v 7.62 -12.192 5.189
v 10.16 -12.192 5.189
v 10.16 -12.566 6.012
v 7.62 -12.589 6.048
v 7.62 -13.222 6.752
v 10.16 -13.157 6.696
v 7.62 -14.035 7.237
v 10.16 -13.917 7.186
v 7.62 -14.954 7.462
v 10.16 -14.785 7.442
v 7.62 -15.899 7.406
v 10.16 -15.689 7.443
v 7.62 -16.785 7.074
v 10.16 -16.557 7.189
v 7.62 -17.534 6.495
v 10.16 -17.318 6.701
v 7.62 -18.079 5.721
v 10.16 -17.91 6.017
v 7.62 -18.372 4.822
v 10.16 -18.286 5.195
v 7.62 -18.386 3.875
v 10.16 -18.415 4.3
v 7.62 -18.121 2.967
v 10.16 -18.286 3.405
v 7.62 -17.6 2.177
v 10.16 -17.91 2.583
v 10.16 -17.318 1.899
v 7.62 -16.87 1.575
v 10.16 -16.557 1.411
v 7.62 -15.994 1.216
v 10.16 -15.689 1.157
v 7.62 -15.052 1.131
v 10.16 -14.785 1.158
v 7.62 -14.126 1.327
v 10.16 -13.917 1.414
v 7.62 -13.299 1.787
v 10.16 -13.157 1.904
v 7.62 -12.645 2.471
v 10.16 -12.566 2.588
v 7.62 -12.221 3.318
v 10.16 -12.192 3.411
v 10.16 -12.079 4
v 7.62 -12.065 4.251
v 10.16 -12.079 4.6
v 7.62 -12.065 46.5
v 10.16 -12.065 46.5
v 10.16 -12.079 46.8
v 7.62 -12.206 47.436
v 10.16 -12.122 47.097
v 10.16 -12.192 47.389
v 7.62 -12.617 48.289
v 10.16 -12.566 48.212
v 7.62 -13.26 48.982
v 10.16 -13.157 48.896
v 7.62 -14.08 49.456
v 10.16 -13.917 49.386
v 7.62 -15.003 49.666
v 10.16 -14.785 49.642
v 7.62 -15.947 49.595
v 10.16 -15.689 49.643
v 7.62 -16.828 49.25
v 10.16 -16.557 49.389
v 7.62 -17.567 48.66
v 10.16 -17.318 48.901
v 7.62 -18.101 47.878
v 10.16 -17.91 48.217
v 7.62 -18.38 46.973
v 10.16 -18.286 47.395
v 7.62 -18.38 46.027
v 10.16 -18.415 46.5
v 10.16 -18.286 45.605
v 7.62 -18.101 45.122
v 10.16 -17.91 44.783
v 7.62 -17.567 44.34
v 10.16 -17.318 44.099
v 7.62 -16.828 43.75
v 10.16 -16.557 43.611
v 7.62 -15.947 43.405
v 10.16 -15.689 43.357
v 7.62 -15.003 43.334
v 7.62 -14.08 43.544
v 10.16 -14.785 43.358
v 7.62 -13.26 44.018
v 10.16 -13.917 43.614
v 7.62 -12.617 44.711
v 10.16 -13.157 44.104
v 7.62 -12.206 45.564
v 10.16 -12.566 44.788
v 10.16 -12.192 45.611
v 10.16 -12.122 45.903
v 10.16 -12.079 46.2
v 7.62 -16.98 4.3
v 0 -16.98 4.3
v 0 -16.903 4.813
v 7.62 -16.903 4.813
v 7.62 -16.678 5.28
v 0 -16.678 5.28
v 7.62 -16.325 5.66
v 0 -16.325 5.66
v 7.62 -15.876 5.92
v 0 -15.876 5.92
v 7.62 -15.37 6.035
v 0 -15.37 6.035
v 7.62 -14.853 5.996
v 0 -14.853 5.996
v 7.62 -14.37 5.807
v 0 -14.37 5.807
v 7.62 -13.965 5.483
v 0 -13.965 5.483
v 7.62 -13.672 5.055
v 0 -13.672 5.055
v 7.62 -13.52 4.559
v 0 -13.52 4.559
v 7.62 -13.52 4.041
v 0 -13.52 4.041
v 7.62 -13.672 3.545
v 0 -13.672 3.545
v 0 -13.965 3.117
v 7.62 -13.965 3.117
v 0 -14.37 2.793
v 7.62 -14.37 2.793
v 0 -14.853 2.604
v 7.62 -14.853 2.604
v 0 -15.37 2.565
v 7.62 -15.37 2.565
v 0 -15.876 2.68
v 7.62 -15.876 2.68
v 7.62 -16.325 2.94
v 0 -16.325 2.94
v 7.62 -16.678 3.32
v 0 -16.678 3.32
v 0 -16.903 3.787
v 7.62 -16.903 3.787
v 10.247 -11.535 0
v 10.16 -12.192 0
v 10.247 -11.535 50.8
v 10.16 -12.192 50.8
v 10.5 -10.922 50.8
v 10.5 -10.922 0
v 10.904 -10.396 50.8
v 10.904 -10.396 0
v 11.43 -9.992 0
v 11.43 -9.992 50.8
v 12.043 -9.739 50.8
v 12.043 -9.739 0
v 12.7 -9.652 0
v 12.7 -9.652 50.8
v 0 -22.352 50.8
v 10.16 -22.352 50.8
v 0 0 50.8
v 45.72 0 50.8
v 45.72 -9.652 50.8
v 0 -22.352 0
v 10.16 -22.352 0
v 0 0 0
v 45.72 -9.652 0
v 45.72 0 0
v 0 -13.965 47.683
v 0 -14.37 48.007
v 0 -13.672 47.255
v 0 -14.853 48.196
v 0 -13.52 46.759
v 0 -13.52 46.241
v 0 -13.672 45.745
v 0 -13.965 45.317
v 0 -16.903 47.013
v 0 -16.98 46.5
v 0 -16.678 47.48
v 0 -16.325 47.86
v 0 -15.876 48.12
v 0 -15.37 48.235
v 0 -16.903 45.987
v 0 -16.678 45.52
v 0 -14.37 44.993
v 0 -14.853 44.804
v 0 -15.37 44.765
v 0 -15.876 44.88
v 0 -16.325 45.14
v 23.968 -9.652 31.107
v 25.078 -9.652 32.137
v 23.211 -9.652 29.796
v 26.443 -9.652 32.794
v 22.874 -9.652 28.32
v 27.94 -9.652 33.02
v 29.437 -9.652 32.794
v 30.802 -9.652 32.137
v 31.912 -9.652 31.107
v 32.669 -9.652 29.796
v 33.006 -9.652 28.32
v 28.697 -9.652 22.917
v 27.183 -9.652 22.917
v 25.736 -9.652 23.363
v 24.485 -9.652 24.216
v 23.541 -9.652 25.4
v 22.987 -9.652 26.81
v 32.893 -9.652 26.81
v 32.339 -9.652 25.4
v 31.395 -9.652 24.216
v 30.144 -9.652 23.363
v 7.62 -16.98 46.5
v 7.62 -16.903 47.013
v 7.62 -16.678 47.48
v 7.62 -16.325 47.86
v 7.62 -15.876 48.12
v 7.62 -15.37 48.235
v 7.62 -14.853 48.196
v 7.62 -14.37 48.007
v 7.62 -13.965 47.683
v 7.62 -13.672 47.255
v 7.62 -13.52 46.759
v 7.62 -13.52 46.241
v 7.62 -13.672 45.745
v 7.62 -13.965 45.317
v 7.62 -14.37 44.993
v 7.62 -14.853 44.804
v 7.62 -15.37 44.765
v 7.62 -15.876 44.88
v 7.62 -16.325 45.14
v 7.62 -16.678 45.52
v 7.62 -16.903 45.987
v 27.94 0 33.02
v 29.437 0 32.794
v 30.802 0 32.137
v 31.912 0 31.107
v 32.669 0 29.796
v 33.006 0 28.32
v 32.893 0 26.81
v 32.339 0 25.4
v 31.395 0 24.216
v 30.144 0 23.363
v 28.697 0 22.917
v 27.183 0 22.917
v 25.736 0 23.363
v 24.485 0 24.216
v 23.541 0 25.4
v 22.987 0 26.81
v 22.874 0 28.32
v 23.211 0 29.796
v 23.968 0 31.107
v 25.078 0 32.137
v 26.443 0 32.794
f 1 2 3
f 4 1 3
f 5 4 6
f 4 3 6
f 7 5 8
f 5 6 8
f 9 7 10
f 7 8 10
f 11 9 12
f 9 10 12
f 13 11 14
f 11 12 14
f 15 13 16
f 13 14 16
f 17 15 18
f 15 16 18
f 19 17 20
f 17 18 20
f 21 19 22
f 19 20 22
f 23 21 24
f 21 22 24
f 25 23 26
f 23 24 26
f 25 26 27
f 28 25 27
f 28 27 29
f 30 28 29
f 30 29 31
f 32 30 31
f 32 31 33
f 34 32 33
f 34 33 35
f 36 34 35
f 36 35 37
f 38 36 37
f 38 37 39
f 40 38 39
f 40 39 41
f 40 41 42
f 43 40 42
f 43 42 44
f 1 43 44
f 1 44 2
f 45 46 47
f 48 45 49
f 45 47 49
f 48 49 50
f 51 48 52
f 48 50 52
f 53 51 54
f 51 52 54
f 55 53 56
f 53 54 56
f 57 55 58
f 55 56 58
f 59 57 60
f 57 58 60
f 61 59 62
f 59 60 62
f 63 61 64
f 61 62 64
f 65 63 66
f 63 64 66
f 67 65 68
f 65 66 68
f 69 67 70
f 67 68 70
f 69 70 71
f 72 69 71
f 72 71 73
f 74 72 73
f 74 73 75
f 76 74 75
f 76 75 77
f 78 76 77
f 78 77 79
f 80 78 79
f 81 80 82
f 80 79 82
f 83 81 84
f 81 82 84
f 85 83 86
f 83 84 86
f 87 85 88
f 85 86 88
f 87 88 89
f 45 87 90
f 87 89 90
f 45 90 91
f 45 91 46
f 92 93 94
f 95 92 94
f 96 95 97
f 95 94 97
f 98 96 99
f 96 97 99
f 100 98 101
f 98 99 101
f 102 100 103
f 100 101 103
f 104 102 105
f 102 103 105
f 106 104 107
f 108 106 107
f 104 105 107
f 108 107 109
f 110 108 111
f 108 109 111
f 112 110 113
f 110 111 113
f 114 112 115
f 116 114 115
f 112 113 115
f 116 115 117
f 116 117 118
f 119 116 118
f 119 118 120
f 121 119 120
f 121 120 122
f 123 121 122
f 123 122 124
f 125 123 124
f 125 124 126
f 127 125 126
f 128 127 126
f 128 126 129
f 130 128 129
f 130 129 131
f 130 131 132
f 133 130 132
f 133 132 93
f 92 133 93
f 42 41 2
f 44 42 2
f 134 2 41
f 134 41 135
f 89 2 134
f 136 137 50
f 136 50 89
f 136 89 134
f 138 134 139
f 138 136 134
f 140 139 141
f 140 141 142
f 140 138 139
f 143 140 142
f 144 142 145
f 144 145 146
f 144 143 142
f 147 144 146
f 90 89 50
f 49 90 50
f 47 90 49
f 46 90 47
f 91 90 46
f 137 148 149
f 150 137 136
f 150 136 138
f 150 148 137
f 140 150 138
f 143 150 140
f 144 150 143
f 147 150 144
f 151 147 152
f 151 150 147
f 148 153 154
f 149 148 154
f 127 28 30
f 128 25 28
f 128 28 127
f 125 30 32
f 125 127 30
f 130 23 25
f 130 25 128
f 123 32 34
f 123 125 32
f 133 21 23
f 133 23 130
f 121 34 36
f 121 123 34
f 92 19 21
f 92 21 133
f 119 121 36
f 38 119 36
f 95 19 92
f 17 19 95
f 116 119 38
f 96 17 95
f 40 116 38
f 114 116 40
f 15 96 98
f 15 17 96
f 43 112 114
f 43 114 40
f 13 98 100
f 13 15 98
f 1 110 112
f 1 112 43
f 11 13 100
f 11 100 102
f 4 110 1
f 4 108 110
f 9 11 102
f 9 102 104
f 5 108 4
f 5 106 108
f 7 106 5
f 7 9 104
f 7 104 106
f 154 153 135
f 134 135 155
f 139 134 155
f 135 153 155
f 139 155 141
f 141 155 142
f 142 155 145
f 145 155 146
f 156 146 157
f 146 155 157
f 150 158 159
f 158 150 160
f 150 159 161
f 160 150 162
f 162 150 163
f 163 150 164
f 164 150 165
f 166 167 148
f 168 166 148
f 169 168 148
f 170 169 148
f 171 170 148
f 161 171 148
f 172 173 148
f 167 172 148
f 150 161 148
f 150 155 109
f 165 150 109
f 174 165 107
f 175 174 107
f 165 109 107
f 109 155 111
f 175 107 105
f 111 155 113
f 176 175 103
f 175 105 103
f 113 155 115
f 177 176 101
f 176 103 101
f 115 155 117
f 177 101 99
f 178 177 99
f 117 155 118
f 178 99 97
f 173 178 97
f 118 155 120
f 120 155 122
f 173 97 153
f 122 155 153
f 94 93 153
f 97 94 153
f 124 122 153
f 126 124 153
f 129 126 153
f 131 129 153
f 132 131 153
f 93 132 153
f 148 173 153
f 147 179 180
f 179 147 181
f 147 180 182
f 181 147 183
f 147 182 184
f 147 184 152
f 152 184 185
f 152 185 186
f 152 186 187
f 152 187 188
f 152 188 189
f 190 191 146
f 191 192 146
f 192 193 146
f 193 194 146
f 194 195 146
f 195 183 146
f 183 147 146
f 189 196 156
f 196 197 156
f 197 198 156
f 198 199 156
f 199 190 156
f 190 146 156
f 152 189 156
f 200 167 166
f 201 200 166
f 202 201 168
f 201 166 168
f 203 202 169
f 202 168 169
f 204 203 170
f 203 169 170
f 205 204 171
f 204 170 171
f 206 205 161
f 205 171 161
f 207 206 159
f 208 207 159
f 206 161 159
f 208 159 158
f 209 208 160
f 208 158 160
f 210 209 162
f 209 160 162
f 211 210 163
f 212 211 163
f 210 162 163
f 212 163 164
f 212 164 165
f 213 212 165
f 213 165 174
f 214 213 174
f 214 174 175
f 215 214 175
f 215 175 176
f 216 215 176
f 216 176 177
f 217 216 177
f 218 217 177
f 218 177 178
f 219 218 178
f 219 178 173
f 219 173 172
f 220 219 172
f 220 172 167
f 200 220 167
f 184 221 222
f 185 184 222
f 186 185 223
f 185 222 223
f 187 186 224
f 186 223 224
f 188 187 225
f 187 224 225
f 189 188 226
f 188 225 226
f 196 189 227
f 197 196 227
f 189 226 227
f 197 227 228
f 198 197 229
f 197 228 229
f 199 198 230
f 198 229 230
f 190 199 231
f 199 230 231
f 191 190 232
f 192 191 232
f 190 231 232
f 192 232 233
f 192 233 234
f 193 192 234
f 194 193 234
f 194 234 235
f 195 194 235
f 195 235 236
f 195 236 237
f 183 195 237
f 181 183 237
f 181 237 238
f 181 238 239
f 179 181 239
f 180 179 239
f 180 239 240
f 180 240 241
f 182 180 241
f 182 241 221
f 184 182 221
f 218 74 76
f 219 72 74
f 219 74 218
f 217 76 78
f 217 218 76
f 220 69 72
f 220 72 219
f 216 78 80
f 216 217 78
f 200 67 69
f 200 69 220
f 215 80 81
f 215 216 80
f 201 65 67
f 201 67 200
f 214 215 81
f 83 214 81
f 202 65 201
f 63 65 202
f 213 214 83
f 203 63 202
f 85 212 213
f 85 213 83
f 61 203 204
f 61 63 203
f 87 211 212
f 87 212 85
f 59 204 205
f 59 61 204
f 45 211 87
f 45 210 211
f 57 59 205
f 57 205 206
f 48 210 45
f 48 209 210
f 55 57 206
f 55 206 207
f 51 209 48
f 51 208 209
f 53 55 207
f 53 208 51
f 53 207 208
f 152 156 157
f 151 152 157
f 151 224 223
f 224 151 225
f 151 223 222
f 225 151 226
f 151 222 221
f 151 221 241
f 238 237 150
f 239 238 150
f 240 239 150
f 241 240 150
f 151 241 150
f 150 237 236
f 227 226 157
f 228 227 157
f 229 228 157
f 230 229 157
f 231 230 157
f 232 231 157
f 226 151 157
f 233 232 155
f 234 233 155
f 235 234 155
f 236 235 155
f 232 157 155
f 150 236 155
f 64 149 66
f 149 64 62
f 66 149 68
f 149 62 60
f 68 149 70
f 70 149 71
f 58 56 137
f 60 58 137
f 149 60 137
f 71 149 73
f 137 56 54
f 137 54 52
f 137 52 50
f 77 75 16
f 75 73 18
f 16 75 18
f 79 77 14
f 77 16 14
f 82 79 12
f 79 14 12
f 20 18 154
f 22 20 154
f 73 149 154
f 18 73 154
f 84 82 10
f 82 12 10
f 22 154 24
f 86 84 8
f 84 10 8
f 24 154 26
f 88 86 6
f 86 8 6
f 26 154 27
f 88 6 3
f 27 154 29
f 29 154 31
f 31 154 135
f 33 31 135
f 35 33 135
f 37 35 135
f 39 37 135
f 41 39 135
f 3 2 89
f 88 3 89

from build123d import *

# Parameters (mm, degrees)
BOSS_EXTRUDE1_DEPTH = 50.8
SKETCH2_R           = 1.7399
CUT_EXTRUDE1_DEPTH  = 45.72
FILLET1_R           = 2.54
SKETCH11_R          = 3.175
CUT_EXTRUDE5_DEPTH  = 2.54
SKETCH12_R          = 5.08
CUT_EXTRUDE6_DEPTH  = 72.906677743


with BuildPart() as part:
    # Sketch1 → Boss-Extrude1 (new body)
    with BuildSketch(Plane.XY):
        Polygon((0, 0), (0, -22.352), (10.16, -22.352), (10.16, -9.652), (45.72, -9.652), (45.72, 0), align=None)
    extrude(amount=BOSS_EXTRUDE1_DEPTH)

    # Sketch2 → Cut-Extrude1 (cut)
    with BuildSketch(Plane.ZY):
        with Locations((4.3, -15.24)):
            Circle(SKETCH2_R)
        with Locations((46.5, -15.24)):
            Circle(SKETCH2_R)
    extrude(amount=-CUT_EXTRUDE1_DEPTH, mode=Mode.SUBTRACT)

    # Fillet1
    fillet1_edges = [part.edges().sort_by_distance(p)[0] for p in [
        (10.16, -9.652, 25.4),
    ]]
    fillet(fillet1_edges, radius=FILLET1_R)

    # Sketch11 → Cut-Extrude5 (cut)
    with BuildSketch(Plane(origin=(10.16, 0, 0), x_dir=(0, 0, -1), z_dir=(1, 0, 0))):
        with Locations((-46.5, -15.24)):
            Circle(SKETCH11_R)
        with Locations((-4.3, -15.24)):
            Circle(SKETCH11_R)
    extrude(amount=-CUT_EXTRUDE5_DEPTH, mode=Mode.SUBTRACT)

    # Sketch12 → Cut-Extrude6 (cut, through all)
    with BuildSketch(Plane(origin=(0, 0, 0), x_dir=(1, 0, 0), z_dir=(0, 1, 0))):
        with Locations((27.94, -27.94)):
            Circle(SKETCH12_R)
    extrude(amount=-CUT_EXTRUDE6_DEPTH, mode=Mode.SUBTRACT)


solid = part.part
